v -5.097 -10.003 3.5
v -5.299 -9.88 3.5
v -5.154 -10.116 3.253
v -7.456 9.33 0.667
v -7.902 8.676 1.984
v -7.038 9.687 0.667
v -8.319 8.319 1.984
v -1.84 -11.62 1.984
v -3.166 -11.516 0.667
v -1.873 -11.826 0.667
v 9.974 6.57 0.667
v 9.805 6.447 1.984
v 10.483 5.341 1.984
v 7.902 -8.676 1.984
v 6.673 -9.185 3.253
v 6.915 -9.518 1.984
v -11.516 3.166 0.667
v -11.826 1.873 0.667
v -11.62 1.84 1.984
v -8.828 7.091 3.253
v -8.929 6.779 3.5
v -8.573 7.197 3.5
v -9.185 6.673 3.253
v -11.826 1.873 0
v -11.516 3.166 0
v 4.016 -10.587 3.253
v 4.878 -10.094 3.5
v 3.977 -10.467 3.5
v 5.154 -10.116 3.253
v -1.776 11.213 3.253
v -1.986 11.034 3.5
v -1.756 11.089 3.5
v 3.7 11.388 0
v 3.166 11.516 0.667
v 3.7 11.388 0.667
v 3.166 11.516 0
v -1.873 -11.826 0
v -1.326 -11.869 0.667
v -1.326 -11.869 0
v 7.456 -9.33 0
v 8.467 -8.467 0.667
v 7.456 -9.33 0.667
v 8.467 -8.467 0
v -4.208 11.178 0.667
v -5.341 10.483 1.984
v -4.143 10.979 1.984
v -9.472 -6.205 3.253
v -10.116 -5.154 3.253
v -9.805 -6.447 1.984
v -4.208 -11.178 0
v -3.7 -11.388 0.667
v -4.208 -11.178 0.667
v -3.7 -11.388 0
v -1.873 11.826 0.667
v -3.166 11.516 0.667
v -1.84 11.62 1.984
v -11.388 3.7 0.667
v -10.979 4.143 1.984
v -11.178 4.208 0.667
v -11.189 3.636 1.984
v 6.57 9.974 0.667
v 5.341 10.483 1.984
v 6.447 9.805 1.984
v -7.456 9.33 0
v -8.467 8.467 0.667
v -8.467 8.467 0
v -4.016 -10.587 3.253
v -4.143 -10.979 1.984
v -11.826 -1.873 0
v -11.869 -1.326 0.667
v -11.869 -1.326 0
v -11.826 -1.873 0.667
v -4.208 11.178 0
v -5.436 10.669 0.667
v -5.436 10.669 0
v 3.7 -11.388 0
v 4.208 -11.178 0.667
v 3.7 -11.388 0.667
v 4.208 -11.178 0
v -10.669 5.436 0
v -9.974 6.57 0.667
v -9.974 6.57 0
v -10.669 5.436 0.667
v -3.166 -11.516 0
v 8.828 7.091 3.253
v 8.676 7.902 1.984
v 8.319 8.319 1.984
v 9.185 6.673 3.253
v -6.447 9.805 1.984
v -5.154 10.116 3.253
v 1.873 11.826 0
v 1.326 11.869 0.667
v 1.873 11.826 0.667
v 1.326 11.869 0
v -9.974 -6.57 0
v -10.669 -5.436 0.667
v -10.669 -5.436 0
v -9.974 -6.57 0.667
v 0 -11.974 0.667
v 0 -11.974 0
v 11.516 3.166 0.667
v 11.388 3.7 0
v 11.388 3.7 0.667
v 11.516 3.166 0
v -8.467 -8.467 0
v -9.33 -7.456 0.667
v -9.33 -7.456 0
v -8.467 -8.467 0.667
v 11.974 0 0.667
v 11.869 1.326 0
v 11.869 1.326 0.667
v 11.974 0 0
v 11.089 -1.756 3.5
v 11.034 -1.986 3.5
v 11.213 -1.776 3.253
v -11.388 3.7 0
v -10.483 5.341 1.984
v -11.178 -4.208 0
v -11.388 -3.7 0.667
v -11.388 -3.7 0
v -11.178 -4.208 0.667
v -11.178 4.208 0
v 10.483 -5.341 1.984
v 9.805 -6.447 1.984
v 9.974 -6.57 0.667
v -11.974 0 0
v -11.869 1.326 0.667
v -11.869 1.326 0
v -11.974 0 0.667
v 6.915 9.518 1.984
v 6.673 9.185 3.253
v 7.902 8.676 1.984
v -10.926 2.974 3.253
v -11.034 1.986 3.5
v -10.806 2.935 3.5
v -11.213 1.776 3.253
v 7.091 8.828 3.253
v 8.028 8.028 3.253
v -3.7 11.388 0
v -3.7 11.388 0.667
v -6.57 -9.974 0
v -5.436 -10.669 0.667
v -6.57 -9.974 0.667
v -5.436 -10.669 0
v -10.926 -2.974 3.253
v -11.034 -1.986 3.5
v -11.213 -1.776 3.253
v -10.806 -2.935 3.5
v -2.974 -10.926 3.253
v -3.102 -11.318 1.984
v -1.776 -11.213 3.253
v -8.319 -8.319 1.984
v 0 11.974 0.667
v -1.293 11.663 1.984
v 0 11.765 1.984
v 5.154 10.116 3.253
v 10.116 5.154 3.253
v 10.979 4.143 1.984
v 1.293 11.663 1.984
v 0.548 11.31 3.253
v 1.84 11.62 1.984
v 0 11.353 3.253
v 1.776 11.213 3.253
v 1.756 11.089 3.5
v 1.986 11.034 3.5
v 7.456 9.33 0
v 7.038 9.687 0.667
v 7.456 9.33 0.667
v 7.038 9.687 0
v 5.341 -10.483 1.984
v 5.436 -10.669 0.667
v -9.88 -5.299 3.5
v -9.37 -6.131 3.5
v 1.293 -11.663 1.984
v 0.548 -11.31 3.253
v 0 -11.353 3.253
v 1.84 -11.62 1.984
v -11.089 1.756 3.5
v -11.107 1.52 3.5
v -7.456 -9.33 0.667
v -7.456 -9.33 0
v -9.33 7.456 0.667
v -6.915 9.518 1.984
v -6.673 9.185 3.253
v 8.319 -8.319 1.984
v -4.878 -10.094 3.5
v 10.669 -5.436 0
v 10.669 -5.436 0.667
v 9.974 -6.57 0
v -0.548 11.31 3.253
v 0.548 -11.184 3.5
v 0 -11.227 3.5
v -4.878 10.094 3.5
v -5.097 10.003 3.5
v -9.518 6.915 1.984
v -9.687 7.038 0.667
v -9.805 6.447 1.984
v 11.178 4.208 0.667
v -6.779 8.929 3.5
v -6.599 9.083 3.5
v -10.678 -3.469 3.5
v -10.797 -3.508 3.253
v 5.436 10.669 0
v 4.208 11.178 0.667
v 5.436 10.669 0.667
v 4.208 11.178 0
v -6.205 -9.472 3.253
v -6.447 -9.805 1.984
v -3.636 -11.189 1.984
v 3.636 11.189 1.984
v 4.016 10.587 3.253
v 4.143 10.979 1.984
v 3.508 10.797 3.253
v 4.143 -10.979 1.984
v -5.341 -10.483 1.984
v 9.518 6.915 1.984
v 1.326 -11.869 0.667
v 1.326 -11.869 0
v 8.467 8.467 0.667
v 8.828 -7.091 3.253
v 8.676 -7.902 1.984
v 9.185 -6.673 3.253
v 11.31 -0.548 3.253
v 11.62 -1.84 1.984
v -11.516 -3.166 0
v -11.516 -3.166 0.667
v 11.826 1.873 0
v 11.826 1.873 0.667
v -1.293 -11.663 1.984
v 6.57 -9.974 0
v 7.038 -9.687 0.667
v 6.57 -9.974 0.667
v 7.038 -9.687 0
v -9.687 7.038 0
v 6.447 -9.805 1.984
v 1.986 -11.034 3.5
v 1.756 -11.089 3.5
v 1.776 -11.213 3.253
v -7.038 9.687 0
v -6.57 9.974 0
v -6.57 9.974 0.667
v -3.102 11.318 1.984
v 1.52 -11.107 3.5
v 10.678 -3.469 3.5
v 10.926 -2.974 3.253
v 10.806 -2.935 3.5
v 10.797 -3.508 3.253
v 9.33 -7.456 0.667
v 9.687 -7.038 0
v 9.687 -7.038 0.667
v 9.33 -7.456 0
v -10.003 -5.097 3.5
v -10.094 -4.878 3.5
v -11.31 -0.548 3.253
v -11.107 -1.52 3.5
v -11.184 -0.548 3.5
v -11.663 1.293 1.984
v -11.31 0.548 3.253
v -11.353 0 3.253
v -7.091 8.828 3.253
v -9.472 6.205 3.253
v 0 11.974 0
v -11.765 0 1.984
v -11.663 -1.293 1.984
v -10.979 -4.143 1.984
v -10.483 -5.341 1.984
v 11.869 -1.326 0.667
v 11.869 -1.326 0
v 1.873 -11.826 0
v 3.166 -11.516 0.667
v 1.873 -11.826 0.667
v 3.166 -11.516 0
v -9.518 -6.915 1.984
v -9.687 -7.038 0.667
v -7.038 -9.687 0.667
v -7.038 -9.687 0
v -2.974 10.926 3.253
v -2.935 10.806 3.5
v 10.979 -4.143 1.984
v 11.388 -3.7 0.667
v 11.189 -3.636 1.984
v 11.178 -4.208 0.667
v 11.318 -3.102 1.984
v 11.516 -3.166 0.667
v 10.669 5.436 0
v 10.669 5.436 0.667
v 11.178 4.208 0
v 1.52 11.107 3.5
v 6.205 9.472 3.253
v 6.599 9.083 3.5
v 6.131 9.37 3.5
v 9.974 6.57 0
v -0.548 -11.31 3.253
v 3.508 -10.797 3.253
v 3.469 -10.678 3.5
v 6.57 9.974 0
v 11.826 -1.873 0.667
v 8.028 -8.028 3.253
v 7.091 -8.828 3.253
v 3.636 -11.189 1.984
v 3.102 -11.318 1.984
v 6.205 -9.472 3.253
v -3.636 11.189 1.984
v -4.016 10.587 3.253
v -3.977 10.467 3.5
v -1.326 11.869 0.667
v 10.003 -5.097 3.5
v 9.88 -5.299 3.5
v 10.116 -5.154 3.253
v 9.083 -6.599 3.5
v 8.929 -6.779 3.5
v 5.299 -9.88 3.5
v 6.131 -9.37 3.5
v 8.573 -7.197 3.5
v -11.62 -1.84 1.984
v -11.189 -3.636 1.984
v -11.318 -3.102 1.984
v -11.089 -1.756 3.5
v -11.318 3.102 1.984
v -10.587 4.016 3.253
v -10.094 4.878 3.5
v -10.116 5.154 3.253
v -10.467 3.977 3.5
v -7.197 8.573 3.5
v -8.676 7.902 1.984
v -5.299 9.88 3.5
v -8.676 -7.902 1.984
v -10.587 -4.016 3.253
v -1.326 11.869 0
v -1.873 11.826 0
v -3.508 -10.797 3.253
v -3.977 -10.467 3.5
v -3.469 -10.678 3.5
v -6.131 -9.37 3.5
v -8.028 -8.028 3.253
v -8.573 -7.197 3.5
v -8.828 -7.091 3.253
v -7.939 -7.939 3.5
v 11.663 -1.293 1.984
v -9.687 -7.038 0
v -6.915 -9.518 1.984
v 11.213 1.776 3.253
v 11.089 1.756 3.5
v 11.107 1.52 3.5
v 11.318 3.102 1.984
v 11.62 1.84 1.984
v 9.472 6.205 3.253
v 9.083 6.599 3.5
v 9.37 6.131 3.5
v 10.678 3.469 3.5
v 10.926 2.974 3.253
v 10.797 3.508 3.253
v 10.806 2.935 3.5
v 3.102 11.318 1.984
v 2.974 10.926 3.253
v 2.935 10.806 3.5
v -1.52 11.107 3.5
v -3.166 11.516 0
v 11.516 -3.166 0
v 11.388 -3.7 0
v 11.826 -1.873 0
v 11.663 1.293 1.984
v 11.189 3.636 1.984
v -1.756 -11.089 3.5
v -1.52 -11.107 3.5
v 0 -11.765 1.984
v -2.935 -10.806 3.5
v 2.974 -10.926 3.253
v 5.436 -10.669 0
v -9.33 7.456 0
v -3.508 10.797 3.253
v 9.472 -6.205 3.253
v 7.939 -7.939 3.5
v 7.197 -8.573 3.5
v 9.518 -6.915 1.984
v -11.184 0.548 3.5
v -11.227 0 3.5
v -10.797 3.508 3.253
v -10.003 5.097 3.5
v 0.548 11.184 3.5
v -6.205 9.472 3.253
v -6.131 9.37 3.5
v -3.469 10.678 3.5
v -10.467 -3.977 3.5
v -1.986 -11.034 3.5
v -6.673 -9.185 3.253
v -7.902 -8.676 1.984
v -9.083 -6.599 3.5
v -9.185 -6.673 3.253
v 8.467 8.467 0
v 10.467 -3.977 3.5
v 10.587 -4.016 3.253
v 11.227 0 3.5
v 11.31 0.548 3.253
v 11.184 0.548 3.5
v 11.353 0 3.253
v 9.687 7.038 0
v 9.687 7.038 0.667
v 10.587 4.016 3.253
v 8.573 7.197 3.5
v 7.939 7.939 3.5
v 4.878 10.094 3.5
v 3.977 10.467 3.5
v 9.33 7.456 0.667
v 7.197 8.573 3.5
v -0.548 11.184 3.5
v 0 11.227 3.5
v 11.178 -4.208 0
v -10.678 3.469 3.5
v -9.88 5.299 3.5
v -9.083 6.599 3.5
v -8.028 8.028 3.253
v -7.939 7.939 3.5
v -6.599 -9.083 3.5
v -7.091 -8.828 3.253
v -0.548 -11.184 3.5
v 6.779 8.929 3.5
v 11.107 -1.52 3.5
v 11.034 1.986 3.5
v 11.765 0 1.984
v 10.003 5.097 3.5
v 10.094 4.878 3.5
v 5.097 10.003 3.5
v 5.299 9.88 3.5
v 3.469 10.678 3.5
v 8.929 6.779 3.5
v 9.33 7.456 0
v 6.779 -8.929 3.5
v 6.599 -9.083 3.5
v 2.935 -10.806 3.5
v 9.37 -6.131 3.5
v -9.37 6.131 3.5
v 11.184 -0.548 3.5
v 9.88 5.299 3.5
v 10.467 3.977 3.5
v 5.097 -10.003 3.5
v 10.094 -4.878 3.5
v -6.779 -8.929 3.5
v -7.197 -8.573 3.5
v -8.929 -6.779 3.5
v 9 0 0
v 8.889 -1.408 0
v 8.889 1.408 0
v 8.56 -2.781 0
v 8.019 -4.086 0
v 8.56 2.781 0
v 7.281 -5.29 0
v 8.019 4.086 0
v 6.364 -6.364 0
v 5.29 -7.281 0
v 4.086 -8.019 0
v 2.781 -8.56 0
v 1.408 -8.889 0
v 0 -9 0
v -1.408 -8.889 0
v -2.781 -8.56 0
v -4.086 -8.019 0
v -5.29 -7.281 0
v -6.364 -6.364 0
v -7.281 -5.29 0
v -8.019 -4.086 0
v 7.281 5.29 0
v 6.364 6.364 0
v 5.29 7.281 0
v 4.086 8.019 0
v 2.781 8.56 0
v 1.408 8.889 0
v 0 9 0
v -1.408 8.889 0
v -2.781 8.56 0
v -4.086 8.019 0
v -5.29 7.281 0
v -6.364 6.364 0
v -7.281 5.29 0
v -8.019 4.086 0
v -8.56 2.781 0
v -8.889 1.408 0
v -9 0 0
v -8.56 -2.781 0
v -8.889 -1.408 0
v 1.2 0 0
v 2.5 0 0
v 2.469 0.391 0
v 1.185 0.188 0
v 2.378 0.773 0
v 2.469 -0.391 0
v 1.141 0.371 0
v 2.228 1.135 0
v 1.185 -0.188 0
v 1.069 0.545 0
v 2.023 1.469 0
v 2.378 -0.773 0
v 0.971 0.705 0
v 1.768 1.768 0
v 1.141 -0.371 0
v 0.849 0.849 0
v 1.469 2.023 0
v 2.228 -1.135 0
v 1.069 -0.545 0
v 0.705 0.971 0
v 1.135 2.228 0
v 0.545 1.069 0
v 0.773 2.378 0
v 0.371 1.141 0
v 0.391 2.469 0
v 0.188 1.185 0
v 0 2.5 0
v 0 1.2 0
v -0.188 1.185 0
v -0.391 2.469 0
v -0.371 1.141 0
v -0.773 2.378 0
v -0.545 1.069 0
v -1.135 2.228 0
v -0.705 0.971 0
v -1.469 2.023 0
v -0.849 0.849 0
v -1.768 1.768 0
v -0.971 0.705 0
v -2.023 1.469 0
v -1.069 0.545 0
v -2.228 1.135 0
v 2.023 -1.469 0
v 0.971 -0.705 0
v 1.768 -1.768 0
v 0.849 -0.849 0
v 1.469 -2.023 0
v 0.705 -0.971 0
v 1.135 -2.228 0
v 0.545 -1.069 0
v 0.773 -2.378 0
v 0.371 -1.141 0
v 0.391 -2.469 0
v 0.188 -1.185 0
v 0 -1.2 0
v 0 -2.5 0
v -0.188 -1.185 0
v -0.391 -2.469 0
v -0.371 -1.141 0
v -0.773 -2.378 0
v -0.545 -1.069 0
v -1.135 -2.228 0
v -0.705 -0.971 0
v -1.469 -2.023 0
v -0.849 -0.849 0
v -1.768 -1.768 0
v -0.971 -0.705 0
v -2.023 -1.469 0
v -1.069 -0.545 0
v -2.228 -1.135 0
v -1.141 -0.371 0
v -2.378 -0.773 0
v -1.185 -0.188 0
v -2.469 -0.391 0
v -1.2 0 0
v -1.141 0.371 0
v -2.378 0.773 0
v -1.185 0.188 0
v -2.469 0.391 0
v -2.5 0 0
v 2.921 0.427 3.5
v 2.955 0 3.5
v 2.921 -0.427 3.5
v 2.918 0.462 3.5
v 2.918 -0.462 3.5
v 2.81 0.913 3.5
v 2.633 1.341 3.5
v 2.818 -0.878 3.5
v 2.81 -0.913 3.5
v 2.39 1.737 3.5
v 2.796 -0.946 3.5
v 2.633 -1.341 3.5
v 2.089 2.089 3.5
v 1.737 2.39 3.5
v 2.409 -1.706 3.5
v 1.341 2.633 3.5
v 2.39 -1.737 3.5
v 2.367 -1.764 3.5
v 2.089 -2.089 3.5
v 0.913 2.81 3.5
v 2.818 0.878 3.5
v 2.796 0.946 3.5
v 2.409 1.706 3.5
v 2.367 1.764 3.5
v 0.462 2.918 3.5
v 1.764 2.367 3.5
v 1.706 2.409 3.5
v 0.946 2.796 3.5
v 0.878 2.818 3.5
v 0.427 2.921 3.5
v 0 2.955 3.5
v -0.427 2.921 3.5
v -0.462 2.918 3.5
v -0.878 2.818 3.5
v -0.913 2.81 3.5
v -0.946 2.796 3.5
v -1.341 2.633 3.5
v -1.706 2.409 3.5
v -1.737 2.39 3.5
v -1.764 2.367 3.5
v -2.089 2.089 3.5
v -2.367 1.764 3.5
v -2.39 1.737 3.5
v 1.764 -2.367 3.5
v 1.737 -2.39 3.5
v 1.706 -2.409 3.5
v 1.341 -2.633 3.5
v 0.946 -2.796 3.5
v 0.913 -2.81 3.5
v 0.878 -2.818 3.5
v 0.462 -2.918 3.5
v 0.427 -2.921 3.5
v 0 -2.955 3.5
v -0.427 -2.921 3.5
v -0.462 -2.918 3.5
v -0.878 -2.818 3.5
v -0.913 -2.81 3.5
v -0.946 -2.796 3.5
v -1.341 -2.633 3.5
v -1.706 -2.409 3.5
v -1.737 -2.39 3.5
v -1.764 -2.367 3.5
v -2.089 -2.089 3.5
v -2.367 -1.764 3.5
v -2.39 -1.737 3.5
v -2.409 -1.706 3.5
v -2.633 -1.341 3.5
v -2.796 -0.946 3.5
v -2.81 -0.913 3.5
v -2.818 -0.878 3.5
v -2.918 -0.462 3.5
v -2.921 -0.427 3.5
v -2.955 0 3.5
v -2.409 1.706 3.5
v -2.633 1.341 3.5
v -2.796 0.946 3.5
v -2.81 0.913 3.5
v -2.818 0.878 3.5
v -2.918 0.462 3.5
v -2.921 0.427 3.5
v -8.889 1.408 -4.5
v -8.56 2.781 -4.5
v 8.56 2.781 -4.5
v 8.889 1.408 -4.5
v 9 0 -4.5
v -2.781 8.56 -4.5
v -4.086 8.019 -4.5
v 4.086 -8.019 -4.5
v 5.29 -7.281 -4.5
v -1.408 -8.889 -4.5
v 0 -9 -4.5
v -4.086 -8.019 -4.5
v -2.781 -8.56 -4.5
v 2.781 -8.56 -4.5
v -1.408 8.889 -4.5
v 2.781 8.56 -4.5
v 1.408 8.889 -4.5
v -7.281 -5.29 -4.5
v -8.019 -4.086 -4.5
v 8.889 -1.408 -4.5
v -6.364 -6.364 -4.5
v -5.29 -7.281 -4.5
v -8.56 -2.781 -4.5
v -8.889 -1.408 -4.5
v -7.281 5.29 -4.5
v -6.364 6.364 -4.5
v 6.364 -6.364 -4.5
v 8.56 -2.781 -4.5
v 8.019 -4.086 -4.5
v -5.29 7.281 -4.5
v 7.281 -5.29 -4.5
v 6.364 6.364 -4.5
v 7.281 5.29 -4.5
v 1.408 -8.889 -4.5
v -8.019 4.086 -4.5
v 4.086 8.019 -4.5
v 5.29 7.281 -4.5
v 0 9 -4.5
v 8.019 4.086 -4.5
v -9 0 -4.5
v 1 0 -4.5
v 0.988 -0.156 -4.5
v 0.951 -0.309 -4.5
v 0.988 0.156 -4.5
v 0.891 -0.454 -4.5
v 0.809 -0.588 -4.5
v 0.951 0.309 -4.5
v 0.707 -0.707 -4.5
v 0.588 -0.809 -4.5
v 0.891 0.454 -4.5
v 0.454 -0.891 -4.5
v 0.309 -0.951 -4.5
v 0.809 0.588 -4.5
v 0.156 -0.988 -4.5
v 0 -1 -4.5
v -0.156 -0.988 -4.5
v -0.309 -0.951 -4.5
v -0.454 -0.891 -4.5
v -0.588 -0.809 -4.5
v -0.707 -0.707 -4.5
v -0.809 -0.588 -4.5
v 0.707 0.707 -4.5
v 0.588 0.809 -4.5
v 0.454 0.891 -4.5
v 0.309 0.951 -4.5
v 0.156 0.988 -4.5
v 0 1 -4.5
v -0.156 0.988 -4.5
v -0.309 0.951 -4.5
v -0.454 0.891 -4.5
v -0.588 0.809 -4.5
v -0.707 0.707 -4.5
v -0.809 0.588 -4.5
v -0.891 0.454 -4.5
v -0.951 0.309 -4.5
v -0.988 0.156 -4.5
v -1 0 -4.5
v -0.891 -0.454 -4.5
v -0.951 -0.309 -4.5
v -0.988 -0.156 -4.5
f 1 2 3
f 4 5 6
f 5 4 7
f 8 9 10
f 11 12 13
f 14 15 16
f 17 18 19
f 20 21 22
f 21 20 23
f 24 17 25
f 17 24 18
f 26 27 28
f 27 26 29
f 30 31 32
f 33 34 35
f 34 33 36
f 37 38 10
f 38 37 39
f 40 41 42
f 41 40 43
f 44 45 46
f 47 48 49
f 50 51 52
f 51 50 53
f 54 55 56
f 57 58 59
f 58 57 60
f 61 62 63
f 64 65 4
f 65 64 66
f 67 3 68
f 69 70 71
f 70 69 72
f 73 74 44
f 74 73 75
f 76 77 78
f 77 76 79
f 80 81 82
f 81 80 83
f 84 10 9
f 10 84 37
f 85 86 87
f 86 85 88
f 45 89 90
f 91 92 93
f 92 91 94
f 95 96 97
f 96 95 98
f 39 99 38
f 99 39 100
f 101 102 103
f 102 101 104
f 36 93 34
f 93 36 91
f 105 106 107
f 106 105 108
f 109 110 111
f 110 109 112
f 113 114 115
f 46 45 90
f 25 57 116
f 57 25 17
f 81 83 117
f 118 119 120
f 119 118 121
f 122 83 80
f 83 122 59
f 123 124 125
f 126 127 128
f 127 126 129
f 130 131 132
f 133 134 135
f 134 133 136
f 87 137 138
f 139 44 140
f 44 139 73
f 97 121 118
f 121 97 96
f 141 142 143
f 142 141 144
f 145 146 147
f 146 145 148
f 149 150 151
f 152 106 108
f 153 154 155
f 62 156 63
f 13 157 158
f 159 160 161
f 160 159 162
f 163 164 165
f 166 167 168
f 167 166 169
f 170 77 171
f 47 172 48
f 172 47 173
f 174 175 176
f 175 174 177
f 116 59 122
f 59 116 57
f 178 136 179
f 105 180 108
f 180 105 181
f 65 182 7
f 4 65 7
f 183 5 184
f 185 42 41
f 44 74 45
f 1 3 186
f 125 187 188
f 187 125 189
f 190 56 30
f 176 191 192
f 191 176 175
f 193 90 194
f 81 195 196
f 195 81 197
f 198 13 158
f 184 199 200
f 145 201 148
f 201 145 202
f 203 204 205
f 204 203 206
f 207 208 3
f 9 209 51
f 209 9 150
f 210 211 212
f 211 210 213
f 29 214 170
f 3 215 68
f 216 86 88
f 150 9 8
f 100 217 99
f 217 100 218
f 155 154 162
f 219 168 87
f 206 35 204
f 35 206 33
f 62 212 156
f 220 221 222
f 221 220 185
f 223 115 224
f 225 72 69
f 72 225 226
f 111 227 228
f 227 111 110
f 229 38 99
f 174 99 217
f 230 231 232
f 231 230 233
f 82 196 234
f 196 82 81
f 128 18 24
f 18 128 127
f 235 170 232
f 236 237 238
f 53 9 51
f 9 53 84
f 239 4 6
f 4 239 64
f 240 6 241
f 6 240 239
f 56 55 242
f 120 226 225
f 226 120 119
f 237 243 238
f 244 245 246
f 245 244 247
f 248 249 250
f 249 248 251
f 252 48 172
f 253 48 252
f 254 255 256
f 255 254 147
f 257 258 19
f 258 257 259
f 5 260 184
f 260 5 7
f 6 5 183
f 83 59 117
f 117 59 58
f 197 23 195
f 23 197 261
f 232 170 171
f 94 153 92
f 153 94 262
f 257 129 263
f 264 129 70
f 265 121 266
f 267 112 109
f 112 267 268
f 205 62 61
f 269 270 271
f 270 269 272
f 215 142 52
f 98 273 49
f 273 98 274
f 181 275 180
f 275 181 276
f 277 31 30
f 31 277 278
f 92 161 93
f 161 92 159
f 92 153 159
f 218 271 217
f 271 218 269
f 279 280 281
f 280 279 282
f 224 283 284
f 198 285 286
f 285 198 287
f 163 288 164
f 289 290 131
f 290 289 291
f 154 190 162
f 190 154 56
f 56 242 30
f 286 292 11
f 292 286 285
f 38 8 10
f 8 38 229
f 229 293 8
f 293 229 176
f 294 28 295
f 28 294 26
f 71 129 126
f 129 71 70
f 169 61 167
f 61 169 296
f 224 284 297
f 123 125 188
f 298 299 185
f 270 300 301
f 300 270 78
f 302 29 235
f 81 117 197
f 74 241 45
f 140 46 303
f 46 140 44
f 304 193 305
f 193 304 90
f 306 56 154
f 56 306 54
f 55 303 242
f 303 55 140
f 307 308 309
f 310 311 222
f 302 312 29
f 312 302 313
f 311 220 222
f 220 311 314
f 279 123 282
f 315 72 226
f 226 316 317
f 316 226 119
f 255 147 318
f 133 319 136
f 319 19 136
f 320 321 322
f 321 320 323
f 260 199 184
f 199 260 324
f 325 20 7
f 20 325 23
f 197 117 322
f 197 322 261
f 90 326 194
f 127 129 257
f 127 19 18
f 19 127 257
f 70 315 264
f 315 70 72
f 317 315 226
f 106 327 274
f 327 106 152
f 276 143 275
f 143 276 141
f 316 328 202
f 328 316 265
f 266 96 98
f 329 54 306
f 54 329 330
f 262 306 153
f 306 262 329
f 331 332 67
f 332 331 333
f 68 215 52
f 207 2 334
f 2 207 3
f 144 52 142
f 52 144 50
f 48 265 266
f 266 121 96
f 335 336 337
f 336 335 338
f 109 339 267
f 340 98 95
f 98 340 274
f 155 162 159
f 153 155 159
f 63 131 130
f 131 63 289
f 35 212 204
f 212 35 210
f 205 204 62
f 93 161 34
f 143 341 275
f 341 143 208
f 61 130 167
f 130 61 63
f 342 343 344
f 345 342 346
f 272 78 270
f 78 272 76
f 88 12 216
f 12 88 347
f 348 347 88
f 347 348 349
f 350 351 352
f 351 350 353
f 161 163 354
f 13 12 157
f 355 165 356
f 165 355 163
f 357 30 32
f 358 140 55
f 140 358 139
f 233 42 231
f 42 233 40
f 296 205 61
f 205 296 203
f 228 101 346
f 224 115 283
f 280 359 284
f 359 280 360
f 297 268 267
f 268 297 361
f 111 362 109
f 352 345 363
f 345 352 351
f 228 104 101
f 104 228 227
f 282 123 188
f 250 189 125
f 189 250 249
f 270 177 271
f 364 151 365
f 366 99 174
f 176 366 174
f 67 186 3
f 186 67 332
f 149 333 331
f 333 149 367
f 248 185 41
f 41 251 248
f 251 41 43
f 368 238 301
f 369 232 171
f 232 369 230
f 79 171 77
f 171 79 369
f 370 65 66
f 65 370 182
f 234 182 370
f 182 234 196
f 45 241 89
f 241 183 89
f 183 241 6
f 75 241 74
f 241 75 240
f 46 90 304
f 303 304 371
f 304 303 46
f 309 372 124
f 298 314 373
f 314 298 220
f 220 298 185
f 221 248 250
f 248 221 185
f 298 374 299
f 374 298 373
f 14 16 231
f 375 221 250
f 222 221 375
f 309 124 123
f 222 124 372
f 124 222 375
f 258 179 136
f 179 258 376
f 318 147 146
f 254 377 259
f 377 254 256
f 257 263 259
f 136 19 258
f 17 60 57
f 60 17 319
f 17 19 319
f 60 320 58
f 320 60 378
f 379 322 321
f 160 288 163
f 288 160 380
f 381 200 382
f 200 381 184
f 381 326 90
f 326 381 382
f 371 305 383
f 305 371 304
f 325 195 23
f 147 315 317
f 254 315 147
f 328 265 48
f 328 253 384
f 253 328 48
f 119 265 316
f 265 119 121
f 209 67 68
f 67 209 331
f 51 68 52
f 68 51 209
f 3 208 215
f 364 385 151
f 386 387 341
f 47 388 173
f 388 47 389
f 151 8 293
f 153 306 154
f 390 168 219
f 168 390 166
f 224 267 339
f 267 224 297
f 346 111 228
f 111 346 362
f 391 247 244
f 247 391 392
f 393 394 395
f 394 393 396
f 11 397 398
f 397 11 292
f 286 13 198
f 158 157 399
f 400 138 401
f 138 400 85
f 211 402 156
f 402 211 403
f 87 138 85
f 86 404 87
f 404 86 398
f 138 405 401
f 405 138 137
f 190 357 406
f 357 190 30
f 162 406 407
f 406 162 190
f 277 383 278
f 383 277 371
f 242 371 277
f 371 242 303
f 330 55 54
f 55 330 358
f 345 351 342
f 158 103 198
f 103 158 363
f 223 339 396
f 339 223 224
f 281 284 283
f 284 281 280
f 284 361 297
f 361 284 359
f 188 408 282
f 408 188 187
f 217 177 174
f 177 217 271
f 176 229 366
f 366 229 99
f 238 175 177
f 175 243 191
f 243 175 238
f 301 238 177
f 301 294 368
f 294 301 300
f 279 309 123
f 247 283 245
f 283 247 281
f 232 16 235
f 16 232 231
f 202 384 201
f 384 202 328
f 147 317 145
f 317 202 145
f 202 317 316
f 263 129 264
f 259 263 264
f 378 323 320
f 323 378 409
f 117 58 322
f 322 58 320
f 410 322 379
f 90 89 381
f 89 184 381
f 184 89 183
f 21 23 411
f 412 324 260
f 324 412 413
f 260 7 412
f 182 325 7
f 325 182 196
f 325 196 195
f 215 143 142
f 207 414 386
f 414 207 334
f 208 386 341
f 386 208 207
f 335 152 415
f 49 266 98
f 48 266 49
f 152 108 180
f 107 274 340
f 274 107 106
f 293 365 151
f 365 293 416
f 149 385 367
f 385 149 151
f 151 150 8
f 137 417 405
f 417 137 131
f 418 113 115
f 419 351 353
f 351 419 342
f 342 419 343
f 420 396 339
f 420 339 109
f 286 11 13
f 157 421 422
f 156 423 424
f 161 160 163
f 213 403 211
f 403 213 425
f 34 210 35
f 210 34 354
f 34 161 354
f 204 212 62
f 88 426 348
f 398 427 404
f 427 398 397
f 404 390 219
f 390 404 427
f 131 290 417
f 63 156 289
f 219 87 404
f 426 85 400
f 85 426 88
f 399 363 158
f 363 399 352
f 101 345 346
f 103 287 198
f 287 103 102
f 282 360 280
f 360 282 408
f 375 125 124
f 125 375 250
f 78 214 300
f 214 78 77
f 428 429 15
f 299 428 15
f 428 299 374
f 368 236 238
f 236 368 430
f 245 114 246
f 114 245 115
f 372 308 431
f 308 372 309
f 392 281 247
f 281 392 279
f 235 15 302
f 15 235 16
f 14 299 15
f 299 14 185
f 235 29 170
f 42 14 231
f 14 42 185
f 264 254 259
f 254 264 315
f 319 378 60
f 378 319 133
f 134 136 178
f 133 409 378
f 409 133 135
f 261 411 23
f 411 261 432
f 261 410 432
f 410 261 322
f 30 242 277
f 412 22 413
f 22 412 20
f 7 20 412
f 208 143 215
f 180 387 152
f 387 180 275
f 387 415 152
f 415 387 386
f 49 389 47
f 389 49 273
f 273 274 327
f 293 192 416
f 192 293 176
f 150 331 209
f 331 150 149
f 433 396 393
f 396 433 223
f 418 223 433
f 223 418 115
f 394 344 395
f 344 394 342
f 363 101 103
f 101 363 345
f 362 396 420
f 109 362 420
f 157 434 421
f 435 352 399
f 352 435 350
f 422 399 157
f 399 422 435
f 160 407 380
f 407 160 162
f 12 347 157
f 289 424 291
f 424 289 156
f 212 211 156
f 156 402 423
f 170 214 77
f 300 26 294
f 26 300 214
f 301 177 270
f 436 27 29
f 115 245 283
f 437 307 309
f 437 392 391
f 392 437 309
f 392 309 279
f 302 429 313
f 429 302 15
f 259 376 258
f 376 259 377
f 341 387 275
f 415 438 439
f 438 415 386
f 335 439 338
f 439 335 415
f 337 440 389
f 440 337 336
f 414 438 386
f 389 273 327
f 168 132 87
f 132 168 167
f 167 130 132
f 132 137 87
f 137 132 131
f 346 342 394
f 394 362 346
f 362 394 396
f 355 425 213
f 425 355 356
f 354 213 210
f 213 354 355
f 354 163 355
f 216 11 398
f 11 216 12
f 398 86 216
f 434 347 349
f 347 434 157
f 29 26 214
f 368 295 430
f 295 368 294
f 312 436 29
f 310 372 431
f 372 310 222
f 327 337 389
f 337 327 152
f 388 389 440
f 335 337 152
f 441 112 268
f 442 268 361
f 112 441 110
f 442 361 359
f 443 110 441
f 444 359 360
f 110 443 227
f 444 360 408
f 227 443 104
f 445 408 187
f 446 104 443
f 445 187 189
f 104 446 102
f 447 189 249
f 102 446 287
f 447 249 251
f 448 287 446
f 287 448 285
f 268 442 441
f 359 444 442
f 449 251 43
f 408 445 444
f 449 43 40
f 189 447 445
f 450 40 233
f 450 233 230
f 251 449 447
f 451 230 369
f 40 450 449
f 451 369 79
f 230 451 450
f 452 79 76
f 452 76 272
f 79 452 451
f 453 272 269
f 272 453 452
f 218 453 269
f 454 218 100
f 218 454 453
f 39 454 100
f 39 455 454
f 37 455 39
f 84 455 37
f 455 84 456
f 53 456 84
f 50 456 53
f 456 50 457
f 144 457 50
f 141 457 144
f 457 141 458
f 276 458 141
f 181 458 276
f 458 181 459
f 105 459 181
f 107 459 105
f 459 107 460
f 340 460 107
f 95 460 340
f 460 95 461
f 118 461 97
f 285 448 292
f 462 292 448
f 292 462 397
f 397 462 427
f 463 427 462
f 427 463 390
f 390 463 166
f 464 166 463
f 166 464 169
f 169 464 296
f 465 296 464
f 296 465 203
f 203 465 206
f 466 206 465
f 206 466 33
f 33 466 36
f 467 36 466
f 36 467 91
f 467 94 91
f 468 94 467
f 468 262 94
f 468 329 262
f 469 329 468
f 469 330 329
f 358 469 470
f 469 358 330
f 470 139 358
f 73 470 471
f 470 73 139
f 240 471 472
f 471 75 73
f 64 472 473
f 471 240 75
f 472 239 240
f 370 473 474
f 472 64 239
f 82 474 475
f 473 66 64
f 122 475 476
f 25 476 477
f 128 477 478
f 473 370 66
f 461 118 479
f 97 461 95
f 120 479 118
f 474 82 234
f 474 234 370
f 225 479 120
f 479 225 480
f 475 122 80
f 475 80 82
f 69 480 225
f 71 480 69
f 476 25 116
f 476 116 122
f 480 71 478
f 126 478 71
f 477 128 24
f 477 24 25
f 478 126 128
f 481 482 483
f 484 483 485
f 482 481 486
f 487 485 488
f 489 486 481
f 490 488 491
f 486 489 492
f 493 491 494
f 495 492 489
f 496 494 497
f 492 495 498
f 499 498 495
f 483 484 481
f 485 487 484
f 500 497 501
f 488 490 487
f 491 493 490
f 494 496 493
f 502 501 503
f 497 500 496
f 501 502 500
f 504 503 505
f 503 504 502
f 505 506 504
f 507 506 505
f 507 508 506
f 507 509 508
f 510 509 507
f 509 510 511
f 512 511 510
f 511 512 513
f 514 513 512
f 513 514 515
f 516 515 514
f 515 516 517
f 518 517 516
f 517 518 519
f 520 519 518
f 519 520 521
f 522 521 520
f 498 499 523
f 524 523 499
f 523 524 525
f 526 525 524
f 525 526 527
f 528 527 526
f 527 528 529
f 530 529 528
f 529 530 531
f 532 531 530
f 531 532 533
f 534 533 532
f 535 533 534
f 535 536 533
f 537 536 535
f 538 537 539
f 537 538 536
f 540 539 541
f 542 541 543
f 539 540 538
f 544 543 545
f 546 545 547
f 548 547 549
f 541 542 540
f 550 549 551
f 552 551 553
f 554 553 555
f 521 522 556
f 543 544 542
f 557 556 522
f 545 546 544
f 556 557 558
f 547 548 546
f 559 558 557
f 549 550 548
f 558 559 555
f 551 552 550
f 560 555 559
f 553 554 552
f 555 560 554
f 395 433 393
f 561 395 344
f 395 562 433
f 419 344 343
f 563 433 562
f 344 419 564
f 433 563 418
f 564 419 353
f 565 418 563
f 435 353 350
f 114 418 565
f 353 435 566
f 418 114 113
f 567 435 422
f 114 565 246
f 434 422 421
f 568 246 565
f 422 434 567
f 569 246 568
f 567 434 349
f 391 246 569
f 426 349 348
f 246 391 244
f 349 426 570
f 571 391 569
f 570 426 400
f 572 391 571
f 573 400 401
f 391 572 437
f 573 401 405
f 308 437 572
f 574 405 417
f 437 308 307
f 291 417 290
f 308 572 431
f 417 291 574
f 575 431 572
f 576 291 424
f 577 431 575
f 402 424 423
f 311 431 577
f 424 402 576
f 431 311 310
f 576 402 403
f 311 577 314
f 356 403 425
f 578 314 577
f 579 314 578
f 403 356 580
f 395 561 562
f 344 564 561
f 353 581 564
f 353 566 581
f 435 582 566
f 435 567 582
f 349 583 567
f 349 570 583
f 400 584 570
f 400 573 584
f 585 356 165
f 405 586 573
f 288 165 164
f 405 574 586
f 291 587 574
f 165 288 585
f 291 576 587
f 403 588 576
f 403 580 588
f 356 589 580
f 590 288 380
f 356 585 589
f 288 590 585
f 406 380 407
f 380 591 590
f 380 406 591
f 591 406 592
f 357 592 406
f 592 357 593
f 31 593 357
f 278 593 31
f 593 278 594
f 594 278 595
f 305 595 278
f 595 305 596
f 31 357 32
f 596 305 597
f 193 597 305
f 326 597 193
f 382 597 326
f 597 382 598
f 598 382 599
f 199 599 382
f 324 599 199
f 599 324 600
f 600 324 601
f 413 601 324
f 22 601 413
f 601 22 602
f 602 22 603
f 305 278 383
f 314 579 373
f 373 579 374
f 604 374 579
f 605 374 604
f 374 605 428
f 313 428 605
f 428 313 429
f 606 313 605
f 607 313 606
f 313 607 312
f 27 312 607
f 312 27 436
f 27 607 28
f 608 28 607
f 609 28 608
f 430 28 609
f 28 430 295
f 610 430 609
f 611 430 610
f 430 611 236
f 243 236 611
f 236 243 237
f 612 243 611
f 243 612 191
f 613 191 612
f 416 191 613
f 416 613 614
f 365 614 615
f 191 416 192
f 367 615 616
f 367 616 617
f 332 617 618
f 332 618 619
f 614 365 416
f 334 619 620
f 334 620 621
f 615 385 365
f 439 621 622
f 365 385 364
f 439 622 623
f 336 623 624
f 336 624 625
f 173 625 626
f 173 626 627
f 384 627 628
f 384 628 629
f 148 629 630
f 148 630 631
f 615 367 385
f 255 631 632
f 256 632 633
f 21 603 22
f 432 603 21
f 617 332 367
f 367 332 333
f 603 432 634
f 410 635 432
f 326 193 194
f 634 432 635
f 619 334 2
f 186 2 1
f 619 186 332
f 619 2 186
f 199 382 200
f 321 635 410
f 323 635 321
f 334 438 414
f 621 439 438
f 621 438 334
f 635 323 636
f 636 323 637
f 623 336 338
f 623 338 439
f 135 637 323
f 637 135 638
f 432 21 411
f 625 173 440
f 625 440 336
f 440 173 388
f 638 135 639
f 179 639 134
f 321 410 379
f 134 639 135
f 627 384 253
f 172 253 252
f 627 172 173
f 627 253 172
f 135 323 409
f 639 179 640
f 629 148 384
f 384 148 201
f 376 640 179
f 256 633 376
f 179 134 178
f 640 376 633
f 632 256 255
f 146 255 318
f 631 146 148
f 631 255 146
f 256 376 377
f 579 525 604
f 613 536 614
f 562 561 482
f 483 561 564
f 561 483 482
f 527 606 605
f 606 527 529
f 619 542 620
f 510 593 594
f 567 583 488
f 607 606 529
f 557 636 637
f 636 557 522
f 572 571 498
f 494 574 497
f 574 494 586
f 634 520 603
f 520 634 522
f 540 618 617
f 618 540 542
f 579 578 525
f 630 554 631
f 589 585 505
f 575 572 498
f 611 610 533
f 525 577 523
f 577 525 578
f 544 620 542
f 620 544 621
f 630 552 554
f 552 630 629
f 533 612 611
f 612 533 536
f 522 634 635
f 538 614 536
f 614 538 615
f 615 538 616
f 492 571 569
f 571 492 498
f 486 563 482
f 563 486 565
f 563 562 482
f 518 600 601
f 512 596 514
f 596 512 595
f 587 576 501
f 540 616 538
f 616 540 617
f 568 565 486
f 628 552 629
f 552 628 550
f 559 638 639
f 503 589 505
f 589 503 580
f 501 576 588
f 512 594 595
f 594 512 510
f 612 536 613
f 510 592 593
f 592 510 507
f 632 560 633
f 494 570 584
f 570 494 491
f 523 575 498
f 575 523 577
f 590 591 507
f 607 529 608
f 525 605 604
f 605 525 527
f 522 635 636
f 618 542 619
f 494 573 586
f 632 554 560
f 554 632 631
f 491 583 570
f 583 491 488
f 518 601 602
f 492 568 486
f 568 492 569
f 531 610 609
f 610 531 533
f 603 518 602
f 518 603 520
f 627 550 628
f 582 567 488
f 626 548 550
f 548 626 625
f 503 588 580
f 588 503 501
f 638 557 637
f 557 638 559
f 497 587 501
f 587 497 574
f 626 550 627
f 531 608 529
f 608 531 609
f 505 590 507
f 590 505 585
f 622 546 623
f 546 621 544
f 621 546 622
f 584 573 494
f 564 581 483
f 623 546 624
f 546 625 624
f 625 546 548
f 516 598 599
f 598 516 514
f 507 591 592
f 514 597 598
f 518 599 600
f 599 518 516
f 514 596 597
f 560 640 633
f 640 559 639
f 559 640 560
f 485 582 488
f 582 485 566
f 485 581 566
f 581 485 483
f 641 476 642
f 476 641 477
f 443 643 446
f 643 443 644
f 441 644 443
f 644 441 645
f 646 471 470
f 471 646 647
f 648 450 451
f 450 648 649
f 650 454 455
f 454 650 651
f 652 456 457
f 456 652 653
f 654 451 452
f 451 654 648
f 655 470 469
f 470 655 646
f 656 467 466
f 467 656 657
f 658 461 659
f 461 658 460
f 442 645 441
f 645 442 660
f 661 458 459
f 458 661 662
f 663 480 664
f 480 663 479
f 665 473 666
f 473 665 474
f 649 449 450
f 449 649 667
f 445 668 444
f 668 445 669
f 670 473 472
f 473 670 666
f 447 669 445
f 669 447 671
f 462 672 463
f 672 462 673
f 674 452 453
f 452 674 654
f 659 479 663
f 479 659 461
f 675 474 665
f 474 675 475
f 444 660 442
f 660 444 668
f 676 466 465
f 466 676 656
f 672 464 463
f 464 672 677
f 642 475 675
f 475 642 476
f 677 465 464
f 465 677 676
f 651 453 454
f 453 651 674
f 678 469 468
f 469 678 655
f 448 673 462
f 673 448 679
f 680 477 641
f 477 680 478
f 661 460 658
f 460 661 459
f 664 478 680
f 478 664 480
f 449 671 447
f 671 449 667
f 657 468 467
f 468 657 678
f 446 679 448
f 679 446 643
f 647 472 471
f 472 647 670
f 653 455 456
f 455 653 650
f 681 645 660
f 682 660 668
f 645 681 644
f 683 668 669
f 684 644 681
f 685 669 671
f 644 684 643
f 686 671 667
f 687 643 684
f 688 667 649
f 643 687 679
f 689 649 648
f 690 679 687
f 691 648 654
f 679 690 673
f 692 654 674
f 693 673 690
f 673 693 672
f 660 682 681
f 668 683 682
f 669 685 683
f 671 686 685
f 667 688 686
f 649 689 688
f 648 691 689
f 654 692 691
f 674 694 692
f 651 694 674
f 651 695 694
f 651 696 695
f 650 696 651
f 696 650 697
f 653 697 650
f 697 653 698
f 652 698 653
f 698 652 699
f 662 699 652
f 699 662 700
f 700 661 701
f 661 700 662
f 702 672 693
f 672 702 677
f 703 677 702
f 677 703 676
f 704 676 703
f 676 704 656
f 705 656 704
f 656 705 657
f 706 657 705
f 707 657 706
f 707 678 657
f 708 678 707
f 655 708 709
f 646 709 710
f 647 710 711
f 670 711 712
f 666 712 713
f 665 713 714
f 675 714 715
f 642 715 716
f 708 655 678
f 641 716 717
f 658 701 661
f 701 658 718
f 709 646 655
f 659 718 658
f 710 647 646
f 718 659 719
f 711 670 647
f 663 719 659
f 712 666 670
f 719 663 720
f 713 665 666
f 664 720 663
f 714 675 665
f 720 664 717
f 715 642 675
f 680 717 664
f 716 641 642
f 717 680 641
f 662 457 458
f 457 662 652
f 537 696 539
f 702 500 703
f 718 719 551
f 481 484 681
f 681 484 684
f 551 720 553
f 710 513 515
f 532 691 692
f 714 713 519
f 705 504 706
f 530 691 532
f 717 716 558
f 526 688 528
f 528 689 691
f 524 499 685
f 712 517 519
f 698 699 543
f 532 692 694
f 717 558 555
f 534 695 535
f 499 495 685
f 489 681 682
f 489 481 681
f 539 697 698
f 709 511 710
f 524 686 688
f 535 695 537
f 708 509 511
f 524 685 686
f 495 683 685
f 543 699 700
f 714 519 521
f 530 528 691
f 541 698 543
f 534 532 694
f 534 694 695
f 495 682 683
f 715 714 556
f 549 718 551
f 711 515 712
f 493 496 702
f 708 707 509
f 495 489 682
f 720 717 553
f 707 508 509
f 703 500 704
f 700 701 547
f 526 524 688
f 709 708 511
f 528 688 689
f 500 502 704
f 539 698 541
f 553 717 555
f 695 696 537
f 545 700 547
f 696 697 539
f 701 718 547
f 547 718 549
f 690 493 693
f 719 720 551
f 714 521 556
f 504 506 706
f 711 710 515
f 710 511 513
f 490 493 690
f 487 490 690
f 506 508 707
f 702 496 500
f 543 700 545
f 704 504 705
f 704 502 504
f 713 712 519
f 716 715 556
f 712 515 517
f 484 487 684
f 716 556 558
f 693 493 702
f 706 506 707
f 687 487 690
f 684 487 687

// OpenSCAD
//Variables
fragmentCount = 40;

footDiameter = 24;
footHeight = 3.5;
footRadius = 8.5;

baseDiameter = 18;
baseHeight = 4.5;

nailHeadDiameter = 5;
nailDiameter = 2;

//Create solid
$fn=fragmentCount;
union()
{
    //Create foot
    difference()
    {
        roundedcylinder(footHeight,footDiameter/2,footRadius,0);
        cylinder(footHeight*1.1, nailHeadDiameter/2, nailHeadDiameter/2*1.2, false);
    }

    //Create base
    difference()
    {
        translate([0,0,-baseHeight])cylinder(baseHeight, baseDiameter/2, baseDiameter/2);
        translate([0,0,-baseHeight])cylinder(baseHeight, nailDiameter/2, nailDiameter/2*1.2, false);
    }
}

module roundedcylinder(zDim, rDim, rTop, rBottom)
{    
    union()
    {
        //Top rounded edge
        intersection()
        {
            if (rTop>zDim)            
            {
                translate([0,0,zDim-rTop/(rTop/zDim)])translate([0,0,-rTop])difference()
                {
                    minkowski()
                    {
                        cylinder(rTop,rDim-rTop,rDim-rTop,false);
                        difference()
                         {
                             sphere(rTop);
                             translate([-rTop,-rTop,-rTop])cube([rTop*2,rTop*2,rTop]);
                         }     
                     }
                     translate([-rDim,-rDim,0])cube([rDim*2,rDim*2,rTop]);
                 }         
             }
             else
             {
                 translate([0,0,zDim-rTop])translate([0,0,-rTop])difference()
                 {
                    minkowski()
                    {
                        cylinder(rTop,rDim-rTop,rDim-rTop,false);
                        difference()
                         {
                             sphere(rTop);
                             translate([-rTop,-rTop,-rTop])cube([rTop*2,rTop*2,rTop]);
                         }     
                     }
                     translate([-rDim,-rDim,0])cube([rDim*2,rDim*2,rTop]);
                 }
             }
             cylinder(zDim,rDim,rDim,false);       
         }   
         
        //Bottom rounded edge
         intersection()
         {
            if(rBottom>zDim)
            {
                translate([0,0,0+rBottom/(rBottom/zDim)])translate([0,0,-rBottom])difference()
                {
                    minkowski()
                    {
                        cylinder(rBottom,rDim-rTop,rDim-rTop,false);
                        translate([0,0,rBottom])difference()
                         {
                             sphere(rBottom);
                             translate([-rBottom,-rBottom,0])cube([rBottom*2,rBottom*2,rBottom]);
                         }     
                     }
                     translate([-rDim,-rDim,rBottom])cube([rDim*2,rDim*2,rBottom]);
                }    
            }
            else
            {
                translate([0,0,rBottom])translate([0,0,-rBottom])difference()
                {
                    minkowski()
                    {
                        cylinder(rBottom,rDim-rTop,rDim-rTop,false);
                        translate([0,0,rBottom])difference()
                         {
                             sphere(rBottom);
                             translate([-rBottom,-rBottom,0])cube([rBottom*2,rBottom*2,rBottom]);
                         }     
                     }
                     translate([-rDim,-rDim,rBottom])cube([rDim*2,rDim*2,rBottom]);
                }
            }
            cylinder(zDim,rDim,rDim,false);                   
        }
    }
}
